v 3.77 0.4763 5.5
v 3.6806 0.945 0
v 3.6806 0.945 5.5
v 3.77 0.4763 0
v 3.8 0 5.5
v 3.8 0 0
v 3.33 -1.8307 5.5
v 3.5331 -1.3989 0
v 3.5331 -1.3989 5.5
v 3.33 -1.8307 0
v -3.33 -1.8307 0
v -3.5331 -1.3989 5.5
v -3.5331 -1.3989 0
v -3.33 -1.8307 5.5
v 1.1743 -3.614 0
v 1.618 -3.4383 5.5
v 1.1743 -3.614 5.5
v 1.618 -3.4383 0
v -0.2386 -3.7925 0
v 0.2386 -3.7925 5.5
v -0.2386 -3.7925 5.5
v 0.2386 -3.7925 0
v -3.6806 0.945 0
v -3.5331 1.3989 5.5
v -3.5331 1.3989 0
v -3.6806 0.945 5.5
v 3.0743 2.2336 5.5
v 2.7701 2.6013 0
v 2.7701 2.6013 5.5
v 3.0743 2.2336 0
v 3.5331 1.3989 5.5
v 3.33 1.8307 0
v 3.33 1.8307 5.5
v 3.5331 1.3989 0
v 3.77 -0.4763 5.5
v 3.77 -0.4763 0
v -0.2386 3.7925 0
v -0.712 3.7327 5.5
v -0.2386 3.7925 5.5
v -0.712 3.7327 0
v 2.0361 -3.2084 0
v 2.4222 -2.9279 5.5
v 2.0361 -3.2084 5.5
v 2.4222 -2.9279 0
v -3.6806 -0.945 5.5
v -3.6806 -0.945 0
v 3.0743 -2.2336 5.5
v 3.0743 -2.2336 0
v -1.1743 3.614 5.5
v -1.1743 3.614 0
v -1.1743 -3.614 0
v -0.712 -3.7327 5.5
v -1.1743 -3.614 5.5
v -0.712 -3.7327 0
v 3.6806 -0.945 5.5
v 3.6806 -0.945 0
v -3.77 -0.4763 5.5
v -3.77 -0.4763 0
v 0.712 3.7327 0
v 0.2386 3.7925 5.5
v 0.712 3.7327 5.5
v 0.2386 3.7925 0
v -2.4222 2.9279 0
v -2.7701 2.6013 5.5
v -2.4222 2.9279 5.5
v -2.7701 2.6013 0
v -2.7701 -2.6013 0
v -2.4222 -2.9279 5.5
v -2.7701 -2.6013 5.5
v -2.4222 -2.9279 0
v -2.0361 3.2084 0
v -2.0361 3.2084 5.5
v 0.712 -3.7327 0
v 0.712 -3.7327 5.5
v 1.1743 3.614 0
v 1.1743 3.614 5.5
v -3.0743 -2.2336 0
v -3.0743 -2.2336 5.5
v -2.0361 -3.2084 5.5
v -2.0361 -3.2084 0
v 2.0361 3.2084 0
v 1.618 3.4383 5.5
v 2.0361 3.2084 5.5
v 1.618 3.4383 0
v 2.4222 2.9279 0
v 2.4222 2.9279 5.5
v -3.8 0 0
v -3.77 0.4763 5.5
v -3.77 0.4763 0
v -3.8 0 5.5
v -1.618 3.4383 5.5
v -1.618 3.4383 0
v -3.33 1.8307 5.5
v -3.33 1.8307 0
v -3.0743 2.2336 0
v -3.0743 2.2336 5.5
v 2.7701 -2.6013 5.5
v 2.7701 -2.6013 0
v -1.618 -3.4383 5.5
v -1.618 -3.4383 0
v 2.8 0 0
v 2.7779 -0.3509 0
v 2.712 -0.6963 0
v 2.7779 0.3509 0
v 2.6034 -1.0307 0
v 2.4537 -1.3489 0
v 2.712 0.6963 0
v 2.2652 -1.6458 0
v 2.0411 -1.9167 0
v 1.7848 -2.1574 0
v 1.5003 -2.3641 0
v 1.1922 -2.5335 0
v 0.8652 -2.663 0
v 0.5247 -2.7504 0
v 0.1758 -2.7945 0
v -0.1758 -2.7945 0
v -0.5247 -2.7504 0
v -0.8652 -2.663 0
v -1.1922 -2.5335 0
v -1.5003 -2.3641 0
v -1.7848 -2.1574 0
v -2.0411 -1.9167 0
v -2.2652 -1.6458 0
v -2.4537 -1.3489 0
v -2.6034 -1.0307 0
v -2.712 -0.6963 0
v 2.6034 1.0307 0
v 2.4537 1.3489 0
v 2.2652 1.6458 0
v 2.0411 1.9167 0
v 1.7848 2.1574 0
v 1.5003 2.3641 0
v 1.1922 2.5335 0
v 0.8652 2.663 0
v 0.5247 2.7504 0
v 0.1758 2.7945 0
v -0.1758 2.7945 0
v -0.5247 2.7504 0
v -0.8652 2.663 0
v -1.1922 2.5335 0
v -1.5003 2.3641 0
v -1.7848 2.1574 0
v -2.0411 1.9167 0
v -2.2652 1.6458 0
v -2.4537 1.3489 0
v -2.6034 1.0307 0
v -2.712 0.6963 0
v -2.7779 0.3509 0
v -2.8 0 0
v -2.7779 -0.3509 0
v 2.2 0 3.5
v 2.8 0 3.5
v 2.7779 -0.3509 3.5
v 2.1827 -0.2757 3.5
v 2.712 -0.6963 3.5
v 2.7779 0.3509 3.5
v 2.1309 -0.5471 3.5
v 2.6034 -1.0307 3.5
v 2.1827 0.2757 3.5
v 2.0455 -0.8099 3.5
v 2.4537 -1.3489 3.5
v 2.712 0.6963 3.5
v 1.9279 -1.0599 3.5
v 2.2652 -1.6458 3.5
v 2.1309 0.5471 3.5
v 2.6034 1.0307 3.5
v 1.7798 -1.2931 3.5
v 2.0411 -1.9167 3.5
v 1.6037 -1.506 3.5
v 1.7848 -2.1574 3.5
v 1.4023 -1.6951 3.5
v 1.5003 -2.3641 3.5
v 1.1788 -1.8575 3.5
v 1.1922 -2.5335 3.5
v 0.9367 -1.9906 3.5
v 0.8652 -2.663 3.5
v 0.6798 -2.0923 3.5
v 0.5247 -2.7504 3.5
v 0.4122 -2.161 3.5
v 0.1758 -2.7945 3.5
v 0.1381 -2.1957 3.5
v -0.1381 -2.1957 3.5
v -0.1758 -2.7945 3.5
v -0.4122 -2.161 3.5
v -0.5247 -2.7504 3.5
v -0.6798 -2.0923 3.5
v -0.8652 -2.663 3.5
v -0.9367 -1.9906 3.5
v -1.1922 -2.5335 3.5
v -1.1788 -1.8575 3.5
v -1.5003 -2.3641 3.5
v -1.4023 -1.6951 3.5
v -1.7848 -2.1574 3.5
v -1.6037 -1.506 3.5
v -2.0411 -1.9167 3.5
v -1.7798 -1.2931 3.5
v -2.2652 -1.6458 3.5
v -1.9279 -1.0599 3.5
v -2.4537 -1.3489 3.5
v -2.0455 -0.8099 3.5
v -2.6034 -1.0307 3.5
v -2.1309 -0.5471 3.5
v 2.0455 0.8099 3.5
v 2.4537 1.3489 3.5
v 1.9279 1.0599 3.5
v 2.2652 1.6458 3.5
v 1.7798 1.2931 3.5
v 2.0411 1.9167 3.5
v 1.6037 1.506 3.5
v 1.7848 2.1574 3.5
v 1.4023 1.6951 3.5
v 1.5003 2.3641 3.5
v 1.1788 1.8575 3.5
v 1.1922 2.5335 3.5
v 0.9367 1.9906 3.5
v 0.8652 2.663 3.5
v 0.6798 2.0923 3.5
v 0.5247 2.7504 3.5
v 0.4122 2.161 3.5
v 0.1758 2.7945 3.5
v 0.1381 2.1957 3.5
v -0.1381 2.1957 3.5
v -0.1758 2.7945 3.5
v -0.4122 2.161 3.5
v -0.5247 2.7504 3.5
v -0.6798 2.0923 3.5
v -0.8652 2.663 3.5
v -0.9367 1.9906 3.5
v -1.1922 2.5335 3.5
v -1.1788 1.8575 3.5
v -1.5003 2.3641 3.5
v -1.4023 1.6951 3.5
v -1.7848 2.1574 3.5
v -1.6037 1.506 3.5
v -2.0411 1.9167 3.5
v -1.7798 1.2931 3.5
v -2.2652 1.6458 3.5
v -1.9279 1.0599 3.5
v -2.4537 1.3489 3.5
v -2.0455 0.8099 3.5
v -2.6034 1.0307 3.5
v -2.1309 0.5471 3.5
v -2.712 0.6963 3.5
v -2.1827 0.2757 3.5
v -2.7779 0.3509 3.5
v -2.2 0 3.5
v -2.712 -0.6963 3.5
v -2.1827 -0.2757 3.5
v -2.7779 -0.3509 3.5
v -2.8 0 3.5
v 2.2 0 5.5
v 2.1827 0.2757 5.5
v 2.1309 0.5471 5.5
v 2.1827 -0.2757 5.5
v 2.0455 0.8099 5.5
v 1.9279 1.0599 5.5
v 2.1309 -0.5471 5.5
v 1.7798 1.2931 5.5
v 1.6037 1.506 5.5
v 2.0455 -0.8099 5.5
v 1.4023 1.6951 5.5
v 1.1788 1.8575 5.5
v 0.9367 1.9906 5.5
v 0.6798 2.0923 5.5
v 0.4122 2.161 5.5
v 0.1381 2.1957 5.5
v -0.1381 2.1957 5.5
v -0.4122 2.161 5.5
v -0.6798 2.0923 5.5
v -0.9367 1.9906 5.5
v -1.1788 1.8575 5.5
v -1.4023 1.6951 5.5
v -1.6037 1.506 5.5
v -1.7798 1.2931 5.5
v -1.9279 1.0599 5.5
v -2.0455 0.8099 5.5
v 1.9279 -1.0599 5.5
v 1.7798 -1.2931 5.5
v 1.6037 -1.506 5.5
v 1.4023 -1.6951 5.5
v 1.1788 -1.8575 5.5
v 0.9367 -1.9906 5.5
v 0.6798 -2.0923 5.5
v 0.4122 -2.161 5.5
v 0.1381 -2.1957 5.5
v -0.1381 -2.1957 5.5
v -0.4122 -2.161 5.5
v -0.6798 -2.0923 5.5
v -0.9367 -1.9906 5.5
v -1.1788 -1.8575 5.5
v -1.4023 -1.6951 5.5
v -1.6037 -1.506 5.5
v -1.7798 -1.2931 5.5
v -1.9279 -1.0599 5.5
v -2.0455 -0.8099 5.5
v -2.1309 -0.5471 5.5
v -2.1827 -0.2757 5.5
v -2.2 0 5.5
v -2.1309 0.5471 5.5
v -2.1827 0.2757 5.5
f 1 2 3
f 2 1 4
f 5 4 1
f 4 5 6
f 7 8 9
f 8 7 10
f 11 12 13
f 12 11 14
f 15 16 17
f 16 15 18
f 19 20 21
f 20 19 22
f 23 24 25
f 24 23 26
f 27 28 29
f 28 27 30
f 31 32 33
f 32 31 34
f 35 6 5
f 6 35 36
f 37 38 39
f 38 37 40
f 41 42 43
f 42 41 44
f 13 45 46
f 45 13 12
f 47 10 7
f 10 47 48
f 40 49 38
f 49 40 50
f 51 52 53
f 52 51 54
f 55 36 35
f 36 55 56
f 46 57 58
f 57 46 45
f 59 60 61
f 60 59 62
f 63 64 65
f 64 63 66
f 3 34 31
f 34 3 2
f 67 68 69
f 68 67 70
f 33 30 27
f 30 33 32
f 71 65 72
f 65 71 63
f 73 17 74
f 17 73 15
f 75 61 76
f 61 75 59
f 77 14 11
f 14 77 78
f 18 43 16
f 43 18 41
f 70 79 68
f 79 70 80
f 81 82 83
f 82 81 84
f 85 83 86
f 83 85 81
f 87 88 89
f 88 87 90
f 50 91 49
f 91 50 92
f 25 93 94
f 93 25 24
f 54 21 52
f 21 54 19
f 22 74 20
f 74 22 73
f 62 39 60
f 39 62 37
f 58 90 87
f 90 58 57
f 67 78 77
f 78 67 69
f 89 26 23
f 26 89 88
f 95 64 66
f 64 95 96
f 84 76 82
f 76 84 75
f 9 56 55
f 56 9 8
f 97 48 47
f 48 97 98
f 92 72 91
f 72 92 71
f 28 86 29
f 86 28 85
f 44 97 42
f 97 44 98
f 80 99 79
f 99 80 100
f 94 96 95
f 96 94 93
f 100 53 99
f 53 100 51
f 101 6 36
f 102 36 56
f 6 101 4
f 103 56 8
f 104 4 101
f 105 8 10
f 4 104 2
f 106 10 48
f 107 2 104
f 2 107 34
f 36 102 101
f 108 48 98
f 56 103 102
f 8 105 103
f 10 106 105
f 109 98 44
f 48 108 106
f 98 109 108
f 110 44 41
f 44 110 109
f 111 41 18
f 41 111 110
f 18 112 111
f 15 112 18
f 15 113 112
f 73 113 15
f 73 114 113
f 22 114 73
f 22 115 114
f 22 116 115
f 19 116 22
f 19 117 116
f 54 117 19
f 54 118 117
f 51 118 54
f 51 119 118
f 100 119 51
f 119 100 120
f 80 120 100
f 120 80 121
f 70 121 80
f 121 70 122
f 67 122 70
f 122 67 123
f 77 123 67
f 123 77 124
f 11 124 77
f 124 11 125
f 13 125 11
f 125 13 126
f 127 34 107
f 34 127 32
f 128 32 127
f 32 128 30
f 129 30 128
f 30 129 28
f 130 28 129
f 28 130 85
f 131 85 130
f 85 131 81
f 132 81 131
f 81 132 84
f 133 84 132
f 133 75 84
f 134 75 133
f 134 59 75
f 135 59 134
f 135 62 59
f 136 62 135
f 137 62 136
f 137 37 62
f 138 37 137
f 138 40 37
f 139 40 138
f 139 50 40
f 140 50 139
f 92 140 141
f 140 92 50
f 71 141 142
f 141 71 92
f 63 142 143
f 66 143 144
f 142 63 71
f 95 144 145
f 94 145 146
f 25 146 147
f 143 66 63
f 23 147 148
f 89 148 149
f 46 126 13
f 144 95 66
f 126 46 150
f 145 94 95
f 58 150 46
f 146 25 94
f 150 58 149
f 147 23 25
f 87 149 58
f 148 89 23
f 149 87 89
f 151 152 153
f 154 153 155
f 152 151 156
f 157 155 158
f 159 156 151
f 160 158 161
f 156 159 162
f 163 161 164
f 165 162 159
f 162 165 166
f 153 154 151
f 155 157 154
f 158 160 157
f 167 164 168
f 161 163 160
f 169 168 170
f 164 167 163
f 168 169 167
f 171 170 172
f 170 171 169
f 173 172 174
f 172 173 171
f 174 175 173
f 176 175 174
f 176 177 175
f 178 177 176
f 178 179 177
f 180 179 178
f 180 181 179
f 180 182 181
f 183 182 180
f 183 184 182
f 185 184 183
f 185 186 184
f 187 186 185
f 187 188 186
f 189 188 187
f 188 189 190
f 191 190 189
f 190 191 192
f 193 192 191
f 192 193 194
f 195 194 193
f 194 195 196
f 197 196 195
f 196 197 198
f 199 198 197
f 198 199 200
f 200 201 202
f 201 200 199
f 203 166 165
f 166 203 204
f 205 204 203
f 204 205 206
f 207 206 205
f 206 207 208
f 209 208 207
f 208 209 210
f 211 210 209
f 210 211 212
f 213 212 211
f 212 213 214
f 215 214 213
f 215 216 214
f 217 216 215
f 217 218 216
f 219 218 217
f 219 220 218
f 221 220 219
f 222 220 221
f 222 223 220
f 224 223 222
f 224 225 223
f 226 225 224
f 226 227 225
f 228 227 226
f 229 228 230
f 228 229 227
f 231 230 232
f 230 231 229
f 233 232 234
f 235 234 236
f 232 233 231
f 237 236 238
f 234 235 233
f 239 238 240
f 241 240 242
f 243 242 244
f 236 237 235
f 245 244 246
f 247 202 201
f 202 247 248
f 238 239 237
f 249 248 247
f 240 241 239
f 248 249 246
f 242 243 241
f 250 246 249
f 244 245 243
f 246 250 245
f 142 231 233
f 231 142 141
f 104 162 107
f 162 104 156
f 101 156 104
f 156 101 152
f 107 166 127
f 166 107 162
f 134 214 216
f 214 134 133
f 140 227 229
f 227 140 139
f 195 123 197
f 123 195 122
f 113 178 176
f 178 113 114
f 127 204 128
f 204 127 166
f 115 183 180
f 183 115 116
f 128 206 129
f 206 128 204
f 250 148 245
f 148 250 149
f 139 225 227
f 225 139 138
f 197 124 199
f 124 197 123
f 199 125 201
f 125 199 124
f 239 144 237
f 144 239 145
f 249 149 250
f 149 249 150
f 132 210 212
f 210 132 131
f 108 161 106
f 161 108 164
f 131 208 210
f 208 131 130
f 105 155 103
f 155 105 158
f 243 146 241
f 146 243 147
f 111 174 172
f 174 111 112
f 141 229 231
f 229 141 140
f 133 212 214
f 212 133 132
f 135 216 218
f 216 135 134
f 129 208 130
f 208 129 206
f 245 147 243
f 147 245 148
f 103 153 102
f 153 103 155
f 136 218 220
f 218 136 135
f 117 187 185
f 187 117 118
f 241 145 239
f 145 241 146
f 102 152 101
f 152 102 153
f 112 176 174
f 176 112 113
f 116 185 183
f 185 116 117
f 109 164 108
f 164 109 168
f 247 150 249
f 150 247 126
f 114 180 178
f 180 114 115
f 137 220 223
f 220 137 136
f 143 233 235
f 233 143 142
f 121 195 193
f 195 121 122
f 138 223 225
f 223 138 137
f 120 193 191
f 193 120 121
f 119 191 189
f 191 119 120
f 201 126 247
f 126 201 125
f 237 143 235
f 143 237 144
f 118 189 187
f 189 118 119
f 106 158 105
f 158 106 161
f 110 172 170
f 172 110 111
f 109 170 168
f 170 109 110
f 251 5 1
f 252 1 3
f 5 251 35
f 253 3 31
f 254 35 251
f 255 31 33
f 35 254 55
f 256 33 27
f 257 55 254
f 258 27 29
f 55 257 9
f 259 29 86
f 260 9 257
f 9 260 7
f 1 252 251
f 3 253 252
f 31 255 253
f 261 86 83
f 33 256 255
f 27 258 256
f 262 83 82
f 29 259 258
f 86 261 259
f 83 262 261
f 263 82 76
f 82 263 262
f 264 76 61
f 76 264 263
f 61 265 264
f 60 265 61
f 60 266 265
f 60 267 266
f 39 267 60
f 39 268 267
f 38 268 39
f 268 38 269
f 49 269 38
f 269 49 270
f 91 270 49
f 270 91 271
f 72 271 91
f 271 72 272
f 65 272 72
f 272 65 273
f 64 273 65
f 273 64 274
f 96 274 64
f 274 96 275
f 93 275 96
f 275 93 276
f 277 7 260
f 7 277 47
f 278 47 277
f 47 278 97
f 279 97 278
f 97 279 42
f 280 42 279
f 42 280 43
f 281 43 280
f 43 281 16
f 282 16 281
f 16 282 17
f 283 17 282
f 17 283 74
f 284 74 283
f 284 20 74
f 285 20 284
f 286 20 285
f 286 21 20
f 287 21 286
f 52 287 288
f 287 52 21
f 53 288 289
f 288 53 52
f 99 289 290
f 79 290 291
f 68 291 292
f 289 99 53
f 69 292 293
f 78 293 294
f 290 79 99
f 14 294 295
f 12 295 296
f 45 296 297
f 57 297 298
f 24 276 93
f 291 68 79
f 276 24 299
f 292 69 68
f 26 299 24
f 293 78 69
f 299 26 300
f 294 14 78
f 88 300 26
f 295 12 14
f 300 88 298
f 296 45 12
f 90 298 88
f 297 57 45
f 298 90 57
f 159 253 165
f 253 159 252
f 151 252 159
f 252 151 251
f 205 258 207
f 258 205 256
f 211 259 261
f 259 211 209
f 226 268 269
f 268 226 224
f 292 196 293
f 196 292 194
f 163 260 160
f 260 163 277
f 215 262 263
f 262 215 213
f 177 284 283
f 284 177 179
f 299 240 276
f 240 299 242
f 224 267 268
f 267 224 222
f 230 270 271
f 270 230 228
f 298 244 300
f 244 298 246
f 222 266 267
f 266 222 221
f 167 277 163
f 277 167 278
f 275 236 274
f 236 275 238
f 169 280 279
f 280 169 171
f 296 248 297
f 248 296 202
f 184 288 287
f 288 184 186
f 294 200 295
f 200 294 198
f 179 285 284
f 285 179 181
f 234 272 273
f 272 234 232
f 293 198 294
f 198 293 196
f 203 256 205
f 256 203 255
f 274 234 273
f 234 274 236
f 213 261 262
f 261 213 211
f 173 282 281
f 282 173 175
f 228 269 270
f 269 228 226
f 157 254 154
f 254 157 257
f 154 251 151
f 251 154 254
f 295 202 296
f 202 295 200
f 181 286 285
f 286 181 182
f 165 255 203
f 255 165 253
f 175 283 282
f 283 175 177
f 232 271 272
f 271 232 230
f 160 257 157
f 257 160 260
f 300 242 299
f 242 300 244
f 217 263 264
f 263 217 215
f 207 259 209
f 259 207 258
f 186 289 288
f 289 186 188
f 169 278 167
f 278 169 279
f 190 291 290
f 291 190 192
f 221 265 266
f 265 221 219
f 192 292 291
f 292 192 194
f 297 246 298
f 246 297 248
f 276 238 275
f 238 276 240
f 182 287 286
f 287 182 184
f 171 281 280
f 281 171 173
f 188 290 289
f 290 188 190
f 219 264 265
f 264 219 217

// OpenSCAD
$fn = 50;
wall = 2;

module leg(head_d=8, bolt_d=4, head_space_h=3.5, cone_h=2.8, pad=0.5) {
  
  ext_d = head_d + wall + pad*2;
  h = head_space_h + wall;

  difference() {
    cylinder(d=ext_d, h=head_space_h);
    cylinder(d=head_d+pad*2, h=head_space_h-cone_h);
    translate([0, 0, head_space_h-cone_h]) {
      cylinder(d1=head_d+pad*2, d2=bolt_d+pad*2, h=cone_h);
    }
  }
  translate([0, 0, head_space_h]) {
    difference() {
      cylinder(d=ext_d, h=wall);
      cylinder(d=bolt_d+pad*2, h=wall);
    }
  }
  
}

//leg(bold_d=4, head_d=8, head_space_h=3.5, cone_h=2.8);
leg(bold_d=3, head_d=5.2, head_space_h=3.5, cone_h=0, pad=0.2);
